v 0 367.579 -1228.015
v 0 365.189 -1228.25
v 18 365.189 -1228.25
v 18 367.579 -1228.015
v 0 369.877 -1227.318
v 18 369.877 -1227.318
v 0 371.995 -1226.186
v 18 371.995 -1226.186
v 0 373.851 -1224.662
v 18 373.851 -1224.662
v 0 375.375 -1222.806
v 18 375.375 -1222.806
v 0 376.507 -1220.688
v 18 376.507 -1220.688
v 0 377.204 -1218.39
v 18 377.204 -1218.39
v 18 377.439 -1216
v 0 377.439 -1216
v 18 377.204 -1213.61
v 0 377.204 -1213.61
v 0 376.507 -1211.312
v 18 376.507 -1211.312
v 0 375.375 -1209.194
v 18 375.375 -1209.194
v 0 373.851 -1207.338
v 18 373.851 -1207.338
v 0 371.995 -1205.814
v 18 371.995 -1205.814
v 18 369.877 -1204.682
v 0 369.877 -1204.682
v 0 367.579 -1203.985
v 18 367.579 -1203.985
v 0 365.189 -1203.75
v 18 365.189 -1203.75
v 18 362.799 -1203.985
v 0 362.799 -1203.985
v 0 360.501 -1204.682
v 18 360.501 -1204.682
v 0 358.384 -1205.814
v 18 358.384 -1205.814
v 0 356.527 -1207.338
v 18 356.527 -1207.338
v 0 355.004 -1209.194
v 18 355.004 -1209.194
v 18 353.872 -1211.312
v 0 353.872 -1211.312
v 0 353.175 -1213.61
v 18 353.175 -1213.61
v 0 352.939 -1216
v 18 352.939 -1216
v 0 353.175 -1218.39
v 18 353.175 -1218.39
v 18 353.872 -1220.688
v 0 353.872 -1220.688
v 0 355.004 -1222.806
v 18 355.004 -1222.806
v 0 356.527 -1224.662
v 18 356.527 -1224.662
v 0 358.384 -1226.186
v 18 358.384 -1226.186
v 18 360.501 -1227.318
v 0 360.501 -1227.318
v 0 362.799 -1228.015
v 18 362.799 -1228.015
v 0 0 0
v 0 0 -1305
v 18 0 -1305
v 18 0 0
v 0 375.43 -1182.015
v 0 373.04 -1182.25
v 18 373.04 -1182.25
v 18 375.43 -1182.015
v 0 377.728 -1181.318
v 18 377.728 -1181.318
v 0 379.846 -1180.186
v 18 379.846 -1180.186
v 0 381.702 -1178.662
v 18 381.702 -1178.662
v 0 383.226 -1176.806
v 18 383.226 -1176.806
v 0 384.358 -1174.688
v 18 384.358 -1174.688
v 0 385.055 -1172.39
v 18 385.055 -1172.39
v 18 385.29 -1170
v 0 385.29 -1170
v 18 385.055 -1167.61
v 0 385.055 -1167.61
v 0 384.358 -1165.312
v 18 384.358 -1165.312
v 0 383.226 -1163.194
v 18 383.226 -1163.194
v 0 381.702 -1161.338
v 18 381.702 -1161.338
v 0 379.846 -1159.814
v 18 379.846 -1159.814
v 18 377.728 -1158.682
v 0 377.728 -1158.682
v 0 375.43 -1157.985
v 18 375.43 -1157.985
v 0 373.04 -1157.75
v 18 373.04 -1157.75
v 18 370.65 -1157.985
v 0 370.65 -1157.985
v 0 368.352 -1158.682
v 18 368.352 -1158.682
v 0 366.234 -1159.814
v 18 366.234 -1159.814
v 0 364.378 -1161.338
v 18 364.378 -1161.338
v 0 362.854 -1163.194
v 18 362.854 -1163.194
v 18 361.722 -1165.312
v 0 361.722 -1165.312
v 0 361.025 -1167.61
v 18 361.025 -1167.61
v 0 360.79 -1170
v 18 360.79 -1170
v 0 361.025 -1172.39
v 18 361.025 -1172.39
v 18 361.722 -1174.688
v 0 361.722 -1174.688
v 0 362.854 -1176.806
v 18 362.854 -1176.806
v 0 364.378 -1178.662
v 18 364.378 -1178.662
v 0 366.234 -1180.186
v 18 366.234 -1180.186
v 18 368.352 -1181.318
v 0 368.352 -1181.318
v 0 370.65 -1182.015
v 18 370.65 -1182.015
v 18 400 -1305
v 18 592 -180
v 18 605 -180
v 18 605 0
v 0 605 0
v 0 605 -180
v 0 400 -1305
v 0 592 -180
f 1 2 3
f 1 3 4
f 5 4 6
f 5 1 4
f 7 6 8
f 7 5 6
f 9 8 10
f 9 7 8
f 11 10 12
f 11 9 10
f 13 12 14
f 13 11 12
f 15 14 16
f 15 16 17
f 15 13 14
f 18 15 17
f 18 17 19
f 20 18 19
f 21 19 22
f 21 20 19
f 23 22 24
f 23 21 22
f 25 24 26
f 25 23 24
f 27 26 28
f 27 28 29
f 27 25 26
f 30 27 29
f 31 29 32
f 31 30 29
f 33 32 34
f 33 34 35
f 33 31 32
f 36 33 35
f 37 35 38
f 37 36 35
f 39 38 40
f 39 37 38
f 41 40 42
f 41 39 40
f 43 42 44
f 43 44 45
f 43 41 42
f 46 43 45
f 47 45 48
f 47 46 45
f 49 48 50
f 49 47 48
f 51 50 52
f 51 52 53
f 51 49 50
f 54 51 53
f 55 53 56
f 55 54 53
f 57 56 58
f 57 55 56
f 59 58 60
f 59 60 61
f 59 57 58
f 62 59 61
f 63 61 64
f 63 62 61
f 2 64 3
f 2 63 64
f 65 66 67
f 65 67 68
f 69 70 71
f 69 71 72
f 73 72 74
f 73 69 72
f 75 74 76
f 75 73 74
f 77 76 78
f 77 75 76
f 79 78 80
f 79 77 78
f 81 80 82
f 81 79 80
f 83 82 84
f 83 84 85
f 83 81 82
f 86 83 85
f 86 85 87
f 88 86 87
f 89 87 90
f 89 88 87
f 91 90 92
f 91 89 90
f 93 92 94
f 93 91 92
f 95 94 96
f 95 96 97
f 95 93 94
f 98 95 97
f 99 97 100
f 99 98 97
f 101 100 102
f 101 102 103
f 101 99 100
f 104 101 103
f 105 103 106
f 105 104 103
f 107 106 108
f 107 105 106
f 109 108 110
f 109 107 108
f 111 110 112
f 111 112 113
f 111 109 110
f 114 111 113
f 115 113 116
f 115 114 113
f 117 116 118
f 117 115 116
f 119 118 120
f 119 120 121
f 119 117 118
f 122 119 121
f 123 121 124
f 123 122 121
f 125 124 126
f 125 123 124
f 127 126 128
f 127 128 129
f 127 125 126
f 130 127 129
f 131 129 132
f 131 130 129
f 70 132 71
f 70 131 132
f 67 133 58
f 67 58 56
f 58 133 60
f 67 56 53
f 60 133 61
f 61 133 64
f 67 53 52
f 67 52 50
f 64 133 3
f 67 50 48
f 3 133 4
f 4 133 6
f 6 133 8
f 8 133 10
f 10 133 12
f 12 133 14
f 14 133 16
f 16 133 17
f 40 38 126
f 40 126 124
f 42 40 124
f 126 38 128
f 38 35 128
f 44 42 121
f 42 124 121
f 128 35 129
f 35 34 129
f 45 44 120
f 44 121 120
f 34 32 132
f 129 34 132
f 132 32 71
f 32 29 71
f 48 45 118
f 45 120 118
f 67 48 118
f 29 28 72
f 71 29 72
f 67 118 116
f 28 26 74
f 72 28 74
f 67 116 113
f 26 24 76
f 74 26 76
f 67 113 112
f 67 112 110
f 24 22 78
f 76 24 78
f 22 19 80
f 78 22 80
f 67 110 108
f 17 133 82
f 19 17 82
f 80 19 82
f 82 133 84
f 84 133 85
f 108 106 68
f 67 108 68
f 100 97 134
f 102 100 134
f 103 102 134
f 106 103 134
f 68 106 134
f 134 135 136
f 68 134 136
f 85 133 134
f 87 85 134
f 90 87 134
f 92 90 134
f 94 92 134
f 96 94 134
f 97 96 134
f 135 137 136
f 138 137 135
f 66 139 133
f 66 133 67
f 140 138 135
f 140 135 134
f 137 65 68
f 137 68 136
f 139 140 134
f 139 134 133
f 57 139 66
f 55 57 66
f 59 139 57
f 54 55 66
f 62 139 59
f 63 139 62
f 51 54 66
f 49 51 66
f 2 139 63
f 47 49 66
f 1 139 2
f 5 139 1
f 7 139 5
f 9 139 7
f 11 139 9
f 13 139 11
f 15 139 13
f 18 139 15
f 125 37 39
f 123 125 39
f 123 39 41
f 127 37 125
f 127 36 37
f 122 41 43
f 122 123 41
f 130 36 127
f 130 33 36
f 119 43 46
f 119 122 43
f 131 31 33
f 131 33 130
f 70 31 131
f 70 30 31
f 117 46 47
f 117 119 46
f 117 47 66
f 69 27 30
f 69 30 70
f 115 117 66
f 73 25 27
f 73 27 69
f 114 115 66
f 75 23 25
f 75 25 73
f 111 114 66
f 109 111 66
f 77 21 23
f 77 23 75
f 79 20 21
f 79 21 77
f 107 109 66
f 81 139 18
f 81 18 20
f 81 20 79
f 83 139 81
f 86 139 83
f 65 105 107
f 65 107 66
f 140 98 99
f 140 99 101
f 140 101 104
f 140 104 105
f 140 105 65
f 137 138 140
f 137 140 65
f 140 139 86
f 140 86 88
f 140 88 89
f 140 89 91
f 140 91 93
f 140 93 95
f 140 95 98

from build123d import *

# Parameters (mm, degrees)
SKETCH1_R           = 12.25
BOSS_EXTRUDE1_DEPTH = 18


with BuildPart() as part:
    # Sketch1 → Boss-Extrude1 (new body)
    with BuildSketch(Plane(origin=(0, 0, 0), x_dir=(0, 0, -1), z_dir=(1, 0, 0))):
        Polygon((0, 0), (0, 605), (180, 605), (180, 592), (1305, 400), (1305, 0), align=None)
        with Locations((1216, 365.189333333)):
            Circle(SKETCH1_R, mode=Mode.SUBTRACT)
        with Locations((1170, 373.04)):
            Circle(SKETCH1_R, mode=Mode.SUBTRACT)
    extrude(amount=BOSS_EXTRUDE1_DEPTH)


solid = part.part
